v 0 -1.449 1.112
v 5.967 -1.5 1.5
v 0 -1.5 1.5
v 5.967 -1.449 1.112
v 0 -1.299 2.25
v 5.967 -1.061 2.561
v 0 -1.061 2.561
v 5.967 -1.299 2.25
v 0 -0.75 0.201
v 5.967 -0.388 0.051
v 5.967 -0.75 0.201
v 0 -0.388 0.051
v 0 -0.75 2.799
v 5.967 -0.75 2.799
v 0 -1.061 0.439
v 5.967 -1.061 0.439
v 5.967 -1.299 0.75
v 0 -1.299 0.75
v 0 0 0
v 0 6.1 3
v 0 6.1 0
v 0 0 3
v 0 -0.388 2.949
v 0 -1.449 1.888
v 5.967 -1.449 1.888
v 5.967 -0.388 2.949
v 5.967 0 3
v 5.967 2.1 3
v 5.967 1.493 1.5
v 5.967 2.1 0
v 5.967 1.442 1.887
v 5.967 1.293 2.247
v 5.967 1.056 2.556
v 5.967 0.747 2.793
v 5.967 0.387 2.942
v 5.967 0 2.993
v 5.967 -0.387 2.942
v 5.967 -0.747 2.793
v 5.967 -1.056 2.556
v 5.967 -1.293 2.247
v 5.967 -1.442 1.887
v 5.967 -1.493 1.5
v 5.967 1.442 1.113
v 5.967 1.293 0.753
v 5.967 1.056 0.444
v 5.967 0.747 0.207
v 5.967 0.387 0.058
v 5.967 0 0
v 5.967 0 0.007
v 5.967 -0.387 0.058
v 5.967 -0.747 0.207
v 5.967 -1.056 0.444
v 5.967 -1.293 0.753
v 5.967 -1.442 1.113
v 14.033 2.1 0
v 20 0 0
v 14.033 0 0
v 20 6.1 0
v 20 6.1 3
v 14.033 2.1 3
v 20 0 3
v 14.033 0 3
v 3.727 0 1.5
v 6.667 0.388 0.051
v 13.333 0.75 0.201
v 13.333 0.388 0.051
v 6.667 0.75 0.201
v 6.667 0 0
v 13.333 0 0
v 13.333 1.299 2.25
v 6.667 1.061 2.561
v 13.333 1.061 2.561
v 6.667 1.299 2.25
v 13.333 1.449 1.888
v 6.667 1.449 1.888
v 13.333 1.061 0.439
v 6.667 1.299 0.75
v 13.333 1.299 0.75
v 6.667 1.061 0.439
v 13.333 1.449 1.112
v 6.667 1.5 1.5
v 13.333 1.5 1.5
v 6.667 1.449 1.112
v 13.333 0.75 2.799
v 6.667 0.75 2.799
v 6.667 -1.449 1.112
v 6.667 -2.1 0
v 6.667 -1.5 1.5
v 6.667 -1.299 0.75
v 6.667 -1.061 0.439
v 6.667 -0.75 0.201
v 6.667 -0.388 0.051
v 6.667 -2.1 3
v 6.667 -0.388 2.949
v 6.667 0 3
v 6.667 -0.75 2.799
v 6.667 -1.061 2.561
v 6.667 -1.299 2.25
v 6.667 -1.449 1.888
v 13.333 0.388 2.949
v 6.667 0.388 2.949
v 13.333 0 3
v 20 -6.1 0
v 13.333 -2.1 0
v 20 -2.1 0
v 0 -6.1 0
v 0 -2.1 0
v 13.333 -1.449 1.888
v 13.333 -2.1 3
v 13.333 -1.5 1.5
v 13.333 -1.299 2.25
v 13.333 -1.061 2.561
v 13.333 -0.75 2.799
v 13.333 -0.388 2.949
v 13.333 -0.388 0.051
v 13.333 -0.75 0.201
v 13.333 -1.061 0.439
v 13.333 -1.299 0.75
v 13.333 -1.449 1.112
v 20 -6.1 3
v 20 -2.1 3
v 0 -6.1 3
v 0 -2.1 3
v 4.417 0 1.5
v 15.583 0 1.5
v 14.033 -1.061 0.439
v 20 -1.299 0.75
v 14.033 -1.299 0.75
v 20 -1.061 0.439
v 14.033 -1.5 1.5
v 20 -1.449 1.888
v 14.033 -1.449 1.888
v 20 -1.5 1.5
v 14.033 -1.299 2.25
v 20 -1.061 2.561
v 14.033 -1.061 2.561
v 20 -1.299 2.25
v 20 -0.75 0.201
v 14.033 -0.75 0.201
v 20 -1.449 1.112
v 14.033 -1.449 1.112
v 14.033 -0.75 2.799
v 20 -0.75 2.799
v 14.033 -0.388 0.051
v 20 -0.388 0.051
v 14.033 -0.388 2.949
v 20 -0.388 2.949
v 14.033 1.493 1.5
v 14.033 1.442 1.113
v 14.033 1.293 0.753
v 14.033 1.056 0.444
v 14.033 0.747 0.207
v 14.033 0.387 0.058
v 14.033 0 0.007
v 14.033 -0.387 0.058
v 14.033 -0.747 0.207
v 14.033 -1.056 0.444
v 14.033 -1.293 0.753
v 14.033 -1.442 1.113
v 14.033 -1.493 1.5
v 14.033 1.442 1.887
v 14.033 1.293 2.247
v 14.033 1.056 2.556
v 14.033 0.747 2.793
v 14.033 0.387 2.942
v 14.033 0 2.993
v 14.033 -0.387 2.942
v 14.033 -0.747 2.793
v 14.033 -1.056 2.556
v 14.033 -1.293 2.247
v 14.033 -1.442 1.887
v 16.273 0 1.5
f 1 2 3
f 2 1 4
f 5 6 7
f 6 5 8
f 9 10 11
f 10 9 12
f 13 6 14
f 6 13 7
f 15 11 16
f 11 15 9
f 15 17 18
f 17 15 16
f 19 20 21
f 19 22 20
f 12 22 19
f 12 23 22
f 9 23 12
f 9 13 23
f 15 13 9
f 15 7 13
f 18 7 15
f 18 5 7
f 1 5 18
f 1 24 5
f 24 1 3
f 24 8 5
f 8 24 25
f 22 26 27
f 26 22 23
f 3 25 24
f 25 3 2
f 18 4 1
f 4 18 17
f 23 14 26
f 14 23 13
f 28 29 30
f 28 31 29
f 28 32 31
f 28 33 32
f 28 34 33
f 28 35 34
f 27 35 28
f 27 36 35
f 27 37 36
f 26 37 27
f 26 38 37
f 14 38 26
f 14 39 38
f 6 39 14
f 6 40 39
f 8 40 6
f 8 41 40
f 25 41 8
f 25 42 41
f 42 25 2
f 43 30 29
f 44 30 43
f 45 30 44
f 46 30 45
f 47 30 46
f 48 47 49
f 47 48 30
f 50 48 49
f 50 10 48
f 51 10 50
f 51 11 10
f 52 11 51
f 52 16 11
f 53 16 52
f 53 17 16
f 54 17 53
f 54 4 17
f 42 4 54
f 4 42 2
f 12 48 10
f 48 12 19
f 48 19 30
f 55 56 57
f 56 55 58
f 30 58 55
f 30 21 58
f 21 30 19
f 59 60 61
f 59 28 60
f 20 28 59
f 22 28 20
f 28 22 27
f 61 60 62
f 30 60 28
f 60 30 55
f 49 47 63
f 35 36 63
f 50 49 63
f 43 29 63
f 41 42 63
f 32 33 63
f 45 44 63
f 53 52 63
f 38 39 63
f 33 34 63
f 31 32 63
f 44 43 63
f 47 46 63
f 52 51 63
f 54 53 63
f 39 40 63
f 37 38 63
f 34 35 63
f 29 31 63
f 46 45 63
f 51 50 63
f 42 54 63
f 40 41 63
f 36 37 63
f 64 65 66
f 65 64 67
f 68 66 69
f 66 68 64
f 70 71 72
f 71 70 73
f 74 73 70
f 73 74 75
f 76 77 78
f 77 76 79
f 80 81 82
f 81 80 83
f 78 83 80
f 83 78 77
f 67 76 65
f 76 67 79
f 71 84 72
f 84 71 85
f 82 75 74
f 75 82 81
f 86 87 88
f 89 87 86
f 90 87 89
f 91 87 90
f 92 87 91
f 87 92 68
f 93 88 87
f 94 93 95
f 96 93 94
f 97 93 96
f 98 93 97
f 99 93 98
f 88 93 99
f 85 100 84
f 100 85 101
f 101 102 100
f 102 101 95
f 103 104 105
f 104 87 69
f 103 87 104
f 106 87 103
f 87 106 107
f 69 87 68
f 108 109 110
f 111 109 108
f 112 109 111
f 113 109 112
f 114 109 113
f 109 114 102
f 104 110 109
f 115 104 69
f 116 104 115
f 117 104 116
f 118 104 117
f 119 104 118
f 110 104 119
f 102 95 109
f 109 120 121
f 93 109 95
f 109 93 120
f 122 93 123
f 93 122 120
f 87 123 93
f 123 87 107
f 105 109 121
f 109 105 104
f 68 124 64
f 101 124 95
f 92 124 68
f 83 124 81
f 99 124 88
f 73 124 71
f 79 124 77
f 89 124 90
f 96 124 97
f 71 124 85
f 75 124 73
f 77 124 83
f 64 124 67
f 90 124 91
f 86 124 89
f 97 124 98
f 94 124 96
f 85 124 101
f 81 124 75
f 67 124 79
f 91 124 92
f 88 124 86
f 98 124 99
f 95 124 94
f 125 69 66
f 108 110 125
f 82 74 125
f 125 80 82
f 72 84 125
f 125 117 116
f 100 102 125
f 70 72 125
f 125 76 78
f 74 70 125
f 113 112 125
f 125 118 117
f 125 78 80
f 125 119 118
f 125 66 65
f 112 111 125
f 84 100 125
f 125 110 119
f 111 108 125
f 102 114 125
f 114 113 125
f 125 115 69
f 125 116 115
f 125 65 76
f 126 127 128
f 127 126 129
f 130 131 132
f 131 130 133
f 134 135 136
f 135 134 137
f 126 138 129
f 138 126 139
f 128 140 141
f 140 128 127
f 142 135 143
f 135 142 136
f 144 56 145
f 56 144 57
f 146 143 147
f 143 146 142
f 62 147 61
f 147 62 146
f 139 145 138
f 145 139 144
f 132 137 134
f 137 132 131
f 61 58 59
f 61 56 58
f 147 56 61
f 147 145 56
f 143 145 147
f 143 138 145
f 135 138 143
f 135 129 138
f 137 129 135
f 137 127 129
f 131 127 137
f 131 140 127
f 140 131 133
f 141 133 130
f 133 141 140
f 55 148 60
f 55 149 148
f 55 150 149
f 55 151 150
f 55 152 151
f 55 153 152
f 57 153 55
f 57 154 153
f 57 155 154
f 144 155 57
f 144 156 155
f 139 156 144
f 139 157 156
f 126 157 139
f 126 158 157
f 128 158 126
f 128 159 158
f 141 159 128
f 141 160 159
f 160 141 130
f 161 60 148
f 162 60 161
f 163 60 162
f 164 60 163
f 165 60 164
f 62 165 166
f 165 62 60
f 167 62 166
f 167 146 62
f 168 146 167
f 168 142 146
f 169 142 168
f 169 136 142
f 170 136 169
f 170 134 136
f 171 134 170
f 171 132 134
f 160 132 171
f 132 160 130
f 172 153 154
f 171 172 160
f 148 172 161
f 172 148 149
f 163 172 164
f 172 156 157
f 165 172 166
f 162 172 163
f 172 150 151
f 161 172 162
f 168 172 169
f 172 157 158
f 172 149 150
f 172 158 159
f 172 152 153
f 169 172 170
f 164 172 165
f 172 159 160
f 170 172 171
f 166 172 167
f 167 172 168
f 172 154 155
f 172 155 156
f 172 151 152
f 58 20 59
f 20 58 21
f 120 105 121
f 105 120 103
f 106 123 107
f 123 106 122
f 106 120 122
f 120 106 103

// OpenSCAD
module mathhinge(){
// mathgrrl cone hinge

//////////////////////////////////////////////////////
// parameters

// Length of the complete hinge
length = 20;

// Height (diameter) of the hinge
height = 3;

// Clearance between cones and holes
clearance = .7;		

// Clearance between hinge and sides
gap = .6; 				

// Parameters that the user does not get to specify
$fn=24*1;
border = 2*1; 
fudge = .01*1;			// to preserve mesh integrity
corner = 0*1;      	// space between hinge and corner
hinge_radius = height/2;
cone_height = 1.5*hinge_radius;  

//////////////////////////////////////////////////////
// renders

rotate(90,[0,1,0]) 
	translate([-hinge_radius,0,0])
		hinge();

translate([0,hinge_radius+gap,0]) bar();
translate([0,-2*border-hinge_radius-gap,0]) bar();

//translate([0,hinge_radius+gap,0]) square();
//translate([0,-length-hinge_radius-gap,0]) square();


//////////////////////////////////////////////////////
// module for hinge

module hinge(){
	rad = hinge_radius;
	clr = clearance;
	len = (length-2*corner)/3; 
	con = cone_height;
	// left outside hinge = (cylinder+box)-cone
	difference(){
		union(){
			translate([0,0,corner]) cylinder(h=len-clr,r=rad);
			translate([-rad,0,corner]) cube([2*rad,rad+gap,len-clr]);
		}
		translate([0,0,corner+len-con-clr+fudge]) cylinder(h=con,r1=0,r2=rad);
	}
	// inside hinge = cylinder+box+cone+cone
	union(){
		translate([0,0,corner+len]) cylinder(h=len,r=rad);
		translate([-rad,-rad-gap,corner+len]) cube([2*rad,rad+gap,len]);
		translate([0,0,corner+len-con]) cylinder(h=con,r1=0,r2=rad);
		translate([0,0,corner+2*len]) cylinder(h=con,r1=rad,r2=0);
	}
	// right outside hinge = (cylinder+box)-cone
	difference(){
		union(){
			translate([0,0,corner+2*len+clr]) cylinder(h=len-clr,r=rad);
			translate([-rad,0,corner+2*len+clr]) cube([2*rad,rad+gap,len-clr]);
		}
		translate([0,0,corner+2*len+clr-fudge]) cylinder(h=con,r1=rad,r2=0);	
	}
}

//////////////////////////////////////////////////////
// module for square shape

module square(){
	difference(){
		cube([length,length,height]);
		translate([border,border,-fudge])
			cube(	[length-2*border,length-2*border,height+2*fudge]);
	}
}

//////////////////////////////////////////////////////
// module for bar shape

module bar(){
	cube([length,2*border,height]);
}
}
mathhinge();
